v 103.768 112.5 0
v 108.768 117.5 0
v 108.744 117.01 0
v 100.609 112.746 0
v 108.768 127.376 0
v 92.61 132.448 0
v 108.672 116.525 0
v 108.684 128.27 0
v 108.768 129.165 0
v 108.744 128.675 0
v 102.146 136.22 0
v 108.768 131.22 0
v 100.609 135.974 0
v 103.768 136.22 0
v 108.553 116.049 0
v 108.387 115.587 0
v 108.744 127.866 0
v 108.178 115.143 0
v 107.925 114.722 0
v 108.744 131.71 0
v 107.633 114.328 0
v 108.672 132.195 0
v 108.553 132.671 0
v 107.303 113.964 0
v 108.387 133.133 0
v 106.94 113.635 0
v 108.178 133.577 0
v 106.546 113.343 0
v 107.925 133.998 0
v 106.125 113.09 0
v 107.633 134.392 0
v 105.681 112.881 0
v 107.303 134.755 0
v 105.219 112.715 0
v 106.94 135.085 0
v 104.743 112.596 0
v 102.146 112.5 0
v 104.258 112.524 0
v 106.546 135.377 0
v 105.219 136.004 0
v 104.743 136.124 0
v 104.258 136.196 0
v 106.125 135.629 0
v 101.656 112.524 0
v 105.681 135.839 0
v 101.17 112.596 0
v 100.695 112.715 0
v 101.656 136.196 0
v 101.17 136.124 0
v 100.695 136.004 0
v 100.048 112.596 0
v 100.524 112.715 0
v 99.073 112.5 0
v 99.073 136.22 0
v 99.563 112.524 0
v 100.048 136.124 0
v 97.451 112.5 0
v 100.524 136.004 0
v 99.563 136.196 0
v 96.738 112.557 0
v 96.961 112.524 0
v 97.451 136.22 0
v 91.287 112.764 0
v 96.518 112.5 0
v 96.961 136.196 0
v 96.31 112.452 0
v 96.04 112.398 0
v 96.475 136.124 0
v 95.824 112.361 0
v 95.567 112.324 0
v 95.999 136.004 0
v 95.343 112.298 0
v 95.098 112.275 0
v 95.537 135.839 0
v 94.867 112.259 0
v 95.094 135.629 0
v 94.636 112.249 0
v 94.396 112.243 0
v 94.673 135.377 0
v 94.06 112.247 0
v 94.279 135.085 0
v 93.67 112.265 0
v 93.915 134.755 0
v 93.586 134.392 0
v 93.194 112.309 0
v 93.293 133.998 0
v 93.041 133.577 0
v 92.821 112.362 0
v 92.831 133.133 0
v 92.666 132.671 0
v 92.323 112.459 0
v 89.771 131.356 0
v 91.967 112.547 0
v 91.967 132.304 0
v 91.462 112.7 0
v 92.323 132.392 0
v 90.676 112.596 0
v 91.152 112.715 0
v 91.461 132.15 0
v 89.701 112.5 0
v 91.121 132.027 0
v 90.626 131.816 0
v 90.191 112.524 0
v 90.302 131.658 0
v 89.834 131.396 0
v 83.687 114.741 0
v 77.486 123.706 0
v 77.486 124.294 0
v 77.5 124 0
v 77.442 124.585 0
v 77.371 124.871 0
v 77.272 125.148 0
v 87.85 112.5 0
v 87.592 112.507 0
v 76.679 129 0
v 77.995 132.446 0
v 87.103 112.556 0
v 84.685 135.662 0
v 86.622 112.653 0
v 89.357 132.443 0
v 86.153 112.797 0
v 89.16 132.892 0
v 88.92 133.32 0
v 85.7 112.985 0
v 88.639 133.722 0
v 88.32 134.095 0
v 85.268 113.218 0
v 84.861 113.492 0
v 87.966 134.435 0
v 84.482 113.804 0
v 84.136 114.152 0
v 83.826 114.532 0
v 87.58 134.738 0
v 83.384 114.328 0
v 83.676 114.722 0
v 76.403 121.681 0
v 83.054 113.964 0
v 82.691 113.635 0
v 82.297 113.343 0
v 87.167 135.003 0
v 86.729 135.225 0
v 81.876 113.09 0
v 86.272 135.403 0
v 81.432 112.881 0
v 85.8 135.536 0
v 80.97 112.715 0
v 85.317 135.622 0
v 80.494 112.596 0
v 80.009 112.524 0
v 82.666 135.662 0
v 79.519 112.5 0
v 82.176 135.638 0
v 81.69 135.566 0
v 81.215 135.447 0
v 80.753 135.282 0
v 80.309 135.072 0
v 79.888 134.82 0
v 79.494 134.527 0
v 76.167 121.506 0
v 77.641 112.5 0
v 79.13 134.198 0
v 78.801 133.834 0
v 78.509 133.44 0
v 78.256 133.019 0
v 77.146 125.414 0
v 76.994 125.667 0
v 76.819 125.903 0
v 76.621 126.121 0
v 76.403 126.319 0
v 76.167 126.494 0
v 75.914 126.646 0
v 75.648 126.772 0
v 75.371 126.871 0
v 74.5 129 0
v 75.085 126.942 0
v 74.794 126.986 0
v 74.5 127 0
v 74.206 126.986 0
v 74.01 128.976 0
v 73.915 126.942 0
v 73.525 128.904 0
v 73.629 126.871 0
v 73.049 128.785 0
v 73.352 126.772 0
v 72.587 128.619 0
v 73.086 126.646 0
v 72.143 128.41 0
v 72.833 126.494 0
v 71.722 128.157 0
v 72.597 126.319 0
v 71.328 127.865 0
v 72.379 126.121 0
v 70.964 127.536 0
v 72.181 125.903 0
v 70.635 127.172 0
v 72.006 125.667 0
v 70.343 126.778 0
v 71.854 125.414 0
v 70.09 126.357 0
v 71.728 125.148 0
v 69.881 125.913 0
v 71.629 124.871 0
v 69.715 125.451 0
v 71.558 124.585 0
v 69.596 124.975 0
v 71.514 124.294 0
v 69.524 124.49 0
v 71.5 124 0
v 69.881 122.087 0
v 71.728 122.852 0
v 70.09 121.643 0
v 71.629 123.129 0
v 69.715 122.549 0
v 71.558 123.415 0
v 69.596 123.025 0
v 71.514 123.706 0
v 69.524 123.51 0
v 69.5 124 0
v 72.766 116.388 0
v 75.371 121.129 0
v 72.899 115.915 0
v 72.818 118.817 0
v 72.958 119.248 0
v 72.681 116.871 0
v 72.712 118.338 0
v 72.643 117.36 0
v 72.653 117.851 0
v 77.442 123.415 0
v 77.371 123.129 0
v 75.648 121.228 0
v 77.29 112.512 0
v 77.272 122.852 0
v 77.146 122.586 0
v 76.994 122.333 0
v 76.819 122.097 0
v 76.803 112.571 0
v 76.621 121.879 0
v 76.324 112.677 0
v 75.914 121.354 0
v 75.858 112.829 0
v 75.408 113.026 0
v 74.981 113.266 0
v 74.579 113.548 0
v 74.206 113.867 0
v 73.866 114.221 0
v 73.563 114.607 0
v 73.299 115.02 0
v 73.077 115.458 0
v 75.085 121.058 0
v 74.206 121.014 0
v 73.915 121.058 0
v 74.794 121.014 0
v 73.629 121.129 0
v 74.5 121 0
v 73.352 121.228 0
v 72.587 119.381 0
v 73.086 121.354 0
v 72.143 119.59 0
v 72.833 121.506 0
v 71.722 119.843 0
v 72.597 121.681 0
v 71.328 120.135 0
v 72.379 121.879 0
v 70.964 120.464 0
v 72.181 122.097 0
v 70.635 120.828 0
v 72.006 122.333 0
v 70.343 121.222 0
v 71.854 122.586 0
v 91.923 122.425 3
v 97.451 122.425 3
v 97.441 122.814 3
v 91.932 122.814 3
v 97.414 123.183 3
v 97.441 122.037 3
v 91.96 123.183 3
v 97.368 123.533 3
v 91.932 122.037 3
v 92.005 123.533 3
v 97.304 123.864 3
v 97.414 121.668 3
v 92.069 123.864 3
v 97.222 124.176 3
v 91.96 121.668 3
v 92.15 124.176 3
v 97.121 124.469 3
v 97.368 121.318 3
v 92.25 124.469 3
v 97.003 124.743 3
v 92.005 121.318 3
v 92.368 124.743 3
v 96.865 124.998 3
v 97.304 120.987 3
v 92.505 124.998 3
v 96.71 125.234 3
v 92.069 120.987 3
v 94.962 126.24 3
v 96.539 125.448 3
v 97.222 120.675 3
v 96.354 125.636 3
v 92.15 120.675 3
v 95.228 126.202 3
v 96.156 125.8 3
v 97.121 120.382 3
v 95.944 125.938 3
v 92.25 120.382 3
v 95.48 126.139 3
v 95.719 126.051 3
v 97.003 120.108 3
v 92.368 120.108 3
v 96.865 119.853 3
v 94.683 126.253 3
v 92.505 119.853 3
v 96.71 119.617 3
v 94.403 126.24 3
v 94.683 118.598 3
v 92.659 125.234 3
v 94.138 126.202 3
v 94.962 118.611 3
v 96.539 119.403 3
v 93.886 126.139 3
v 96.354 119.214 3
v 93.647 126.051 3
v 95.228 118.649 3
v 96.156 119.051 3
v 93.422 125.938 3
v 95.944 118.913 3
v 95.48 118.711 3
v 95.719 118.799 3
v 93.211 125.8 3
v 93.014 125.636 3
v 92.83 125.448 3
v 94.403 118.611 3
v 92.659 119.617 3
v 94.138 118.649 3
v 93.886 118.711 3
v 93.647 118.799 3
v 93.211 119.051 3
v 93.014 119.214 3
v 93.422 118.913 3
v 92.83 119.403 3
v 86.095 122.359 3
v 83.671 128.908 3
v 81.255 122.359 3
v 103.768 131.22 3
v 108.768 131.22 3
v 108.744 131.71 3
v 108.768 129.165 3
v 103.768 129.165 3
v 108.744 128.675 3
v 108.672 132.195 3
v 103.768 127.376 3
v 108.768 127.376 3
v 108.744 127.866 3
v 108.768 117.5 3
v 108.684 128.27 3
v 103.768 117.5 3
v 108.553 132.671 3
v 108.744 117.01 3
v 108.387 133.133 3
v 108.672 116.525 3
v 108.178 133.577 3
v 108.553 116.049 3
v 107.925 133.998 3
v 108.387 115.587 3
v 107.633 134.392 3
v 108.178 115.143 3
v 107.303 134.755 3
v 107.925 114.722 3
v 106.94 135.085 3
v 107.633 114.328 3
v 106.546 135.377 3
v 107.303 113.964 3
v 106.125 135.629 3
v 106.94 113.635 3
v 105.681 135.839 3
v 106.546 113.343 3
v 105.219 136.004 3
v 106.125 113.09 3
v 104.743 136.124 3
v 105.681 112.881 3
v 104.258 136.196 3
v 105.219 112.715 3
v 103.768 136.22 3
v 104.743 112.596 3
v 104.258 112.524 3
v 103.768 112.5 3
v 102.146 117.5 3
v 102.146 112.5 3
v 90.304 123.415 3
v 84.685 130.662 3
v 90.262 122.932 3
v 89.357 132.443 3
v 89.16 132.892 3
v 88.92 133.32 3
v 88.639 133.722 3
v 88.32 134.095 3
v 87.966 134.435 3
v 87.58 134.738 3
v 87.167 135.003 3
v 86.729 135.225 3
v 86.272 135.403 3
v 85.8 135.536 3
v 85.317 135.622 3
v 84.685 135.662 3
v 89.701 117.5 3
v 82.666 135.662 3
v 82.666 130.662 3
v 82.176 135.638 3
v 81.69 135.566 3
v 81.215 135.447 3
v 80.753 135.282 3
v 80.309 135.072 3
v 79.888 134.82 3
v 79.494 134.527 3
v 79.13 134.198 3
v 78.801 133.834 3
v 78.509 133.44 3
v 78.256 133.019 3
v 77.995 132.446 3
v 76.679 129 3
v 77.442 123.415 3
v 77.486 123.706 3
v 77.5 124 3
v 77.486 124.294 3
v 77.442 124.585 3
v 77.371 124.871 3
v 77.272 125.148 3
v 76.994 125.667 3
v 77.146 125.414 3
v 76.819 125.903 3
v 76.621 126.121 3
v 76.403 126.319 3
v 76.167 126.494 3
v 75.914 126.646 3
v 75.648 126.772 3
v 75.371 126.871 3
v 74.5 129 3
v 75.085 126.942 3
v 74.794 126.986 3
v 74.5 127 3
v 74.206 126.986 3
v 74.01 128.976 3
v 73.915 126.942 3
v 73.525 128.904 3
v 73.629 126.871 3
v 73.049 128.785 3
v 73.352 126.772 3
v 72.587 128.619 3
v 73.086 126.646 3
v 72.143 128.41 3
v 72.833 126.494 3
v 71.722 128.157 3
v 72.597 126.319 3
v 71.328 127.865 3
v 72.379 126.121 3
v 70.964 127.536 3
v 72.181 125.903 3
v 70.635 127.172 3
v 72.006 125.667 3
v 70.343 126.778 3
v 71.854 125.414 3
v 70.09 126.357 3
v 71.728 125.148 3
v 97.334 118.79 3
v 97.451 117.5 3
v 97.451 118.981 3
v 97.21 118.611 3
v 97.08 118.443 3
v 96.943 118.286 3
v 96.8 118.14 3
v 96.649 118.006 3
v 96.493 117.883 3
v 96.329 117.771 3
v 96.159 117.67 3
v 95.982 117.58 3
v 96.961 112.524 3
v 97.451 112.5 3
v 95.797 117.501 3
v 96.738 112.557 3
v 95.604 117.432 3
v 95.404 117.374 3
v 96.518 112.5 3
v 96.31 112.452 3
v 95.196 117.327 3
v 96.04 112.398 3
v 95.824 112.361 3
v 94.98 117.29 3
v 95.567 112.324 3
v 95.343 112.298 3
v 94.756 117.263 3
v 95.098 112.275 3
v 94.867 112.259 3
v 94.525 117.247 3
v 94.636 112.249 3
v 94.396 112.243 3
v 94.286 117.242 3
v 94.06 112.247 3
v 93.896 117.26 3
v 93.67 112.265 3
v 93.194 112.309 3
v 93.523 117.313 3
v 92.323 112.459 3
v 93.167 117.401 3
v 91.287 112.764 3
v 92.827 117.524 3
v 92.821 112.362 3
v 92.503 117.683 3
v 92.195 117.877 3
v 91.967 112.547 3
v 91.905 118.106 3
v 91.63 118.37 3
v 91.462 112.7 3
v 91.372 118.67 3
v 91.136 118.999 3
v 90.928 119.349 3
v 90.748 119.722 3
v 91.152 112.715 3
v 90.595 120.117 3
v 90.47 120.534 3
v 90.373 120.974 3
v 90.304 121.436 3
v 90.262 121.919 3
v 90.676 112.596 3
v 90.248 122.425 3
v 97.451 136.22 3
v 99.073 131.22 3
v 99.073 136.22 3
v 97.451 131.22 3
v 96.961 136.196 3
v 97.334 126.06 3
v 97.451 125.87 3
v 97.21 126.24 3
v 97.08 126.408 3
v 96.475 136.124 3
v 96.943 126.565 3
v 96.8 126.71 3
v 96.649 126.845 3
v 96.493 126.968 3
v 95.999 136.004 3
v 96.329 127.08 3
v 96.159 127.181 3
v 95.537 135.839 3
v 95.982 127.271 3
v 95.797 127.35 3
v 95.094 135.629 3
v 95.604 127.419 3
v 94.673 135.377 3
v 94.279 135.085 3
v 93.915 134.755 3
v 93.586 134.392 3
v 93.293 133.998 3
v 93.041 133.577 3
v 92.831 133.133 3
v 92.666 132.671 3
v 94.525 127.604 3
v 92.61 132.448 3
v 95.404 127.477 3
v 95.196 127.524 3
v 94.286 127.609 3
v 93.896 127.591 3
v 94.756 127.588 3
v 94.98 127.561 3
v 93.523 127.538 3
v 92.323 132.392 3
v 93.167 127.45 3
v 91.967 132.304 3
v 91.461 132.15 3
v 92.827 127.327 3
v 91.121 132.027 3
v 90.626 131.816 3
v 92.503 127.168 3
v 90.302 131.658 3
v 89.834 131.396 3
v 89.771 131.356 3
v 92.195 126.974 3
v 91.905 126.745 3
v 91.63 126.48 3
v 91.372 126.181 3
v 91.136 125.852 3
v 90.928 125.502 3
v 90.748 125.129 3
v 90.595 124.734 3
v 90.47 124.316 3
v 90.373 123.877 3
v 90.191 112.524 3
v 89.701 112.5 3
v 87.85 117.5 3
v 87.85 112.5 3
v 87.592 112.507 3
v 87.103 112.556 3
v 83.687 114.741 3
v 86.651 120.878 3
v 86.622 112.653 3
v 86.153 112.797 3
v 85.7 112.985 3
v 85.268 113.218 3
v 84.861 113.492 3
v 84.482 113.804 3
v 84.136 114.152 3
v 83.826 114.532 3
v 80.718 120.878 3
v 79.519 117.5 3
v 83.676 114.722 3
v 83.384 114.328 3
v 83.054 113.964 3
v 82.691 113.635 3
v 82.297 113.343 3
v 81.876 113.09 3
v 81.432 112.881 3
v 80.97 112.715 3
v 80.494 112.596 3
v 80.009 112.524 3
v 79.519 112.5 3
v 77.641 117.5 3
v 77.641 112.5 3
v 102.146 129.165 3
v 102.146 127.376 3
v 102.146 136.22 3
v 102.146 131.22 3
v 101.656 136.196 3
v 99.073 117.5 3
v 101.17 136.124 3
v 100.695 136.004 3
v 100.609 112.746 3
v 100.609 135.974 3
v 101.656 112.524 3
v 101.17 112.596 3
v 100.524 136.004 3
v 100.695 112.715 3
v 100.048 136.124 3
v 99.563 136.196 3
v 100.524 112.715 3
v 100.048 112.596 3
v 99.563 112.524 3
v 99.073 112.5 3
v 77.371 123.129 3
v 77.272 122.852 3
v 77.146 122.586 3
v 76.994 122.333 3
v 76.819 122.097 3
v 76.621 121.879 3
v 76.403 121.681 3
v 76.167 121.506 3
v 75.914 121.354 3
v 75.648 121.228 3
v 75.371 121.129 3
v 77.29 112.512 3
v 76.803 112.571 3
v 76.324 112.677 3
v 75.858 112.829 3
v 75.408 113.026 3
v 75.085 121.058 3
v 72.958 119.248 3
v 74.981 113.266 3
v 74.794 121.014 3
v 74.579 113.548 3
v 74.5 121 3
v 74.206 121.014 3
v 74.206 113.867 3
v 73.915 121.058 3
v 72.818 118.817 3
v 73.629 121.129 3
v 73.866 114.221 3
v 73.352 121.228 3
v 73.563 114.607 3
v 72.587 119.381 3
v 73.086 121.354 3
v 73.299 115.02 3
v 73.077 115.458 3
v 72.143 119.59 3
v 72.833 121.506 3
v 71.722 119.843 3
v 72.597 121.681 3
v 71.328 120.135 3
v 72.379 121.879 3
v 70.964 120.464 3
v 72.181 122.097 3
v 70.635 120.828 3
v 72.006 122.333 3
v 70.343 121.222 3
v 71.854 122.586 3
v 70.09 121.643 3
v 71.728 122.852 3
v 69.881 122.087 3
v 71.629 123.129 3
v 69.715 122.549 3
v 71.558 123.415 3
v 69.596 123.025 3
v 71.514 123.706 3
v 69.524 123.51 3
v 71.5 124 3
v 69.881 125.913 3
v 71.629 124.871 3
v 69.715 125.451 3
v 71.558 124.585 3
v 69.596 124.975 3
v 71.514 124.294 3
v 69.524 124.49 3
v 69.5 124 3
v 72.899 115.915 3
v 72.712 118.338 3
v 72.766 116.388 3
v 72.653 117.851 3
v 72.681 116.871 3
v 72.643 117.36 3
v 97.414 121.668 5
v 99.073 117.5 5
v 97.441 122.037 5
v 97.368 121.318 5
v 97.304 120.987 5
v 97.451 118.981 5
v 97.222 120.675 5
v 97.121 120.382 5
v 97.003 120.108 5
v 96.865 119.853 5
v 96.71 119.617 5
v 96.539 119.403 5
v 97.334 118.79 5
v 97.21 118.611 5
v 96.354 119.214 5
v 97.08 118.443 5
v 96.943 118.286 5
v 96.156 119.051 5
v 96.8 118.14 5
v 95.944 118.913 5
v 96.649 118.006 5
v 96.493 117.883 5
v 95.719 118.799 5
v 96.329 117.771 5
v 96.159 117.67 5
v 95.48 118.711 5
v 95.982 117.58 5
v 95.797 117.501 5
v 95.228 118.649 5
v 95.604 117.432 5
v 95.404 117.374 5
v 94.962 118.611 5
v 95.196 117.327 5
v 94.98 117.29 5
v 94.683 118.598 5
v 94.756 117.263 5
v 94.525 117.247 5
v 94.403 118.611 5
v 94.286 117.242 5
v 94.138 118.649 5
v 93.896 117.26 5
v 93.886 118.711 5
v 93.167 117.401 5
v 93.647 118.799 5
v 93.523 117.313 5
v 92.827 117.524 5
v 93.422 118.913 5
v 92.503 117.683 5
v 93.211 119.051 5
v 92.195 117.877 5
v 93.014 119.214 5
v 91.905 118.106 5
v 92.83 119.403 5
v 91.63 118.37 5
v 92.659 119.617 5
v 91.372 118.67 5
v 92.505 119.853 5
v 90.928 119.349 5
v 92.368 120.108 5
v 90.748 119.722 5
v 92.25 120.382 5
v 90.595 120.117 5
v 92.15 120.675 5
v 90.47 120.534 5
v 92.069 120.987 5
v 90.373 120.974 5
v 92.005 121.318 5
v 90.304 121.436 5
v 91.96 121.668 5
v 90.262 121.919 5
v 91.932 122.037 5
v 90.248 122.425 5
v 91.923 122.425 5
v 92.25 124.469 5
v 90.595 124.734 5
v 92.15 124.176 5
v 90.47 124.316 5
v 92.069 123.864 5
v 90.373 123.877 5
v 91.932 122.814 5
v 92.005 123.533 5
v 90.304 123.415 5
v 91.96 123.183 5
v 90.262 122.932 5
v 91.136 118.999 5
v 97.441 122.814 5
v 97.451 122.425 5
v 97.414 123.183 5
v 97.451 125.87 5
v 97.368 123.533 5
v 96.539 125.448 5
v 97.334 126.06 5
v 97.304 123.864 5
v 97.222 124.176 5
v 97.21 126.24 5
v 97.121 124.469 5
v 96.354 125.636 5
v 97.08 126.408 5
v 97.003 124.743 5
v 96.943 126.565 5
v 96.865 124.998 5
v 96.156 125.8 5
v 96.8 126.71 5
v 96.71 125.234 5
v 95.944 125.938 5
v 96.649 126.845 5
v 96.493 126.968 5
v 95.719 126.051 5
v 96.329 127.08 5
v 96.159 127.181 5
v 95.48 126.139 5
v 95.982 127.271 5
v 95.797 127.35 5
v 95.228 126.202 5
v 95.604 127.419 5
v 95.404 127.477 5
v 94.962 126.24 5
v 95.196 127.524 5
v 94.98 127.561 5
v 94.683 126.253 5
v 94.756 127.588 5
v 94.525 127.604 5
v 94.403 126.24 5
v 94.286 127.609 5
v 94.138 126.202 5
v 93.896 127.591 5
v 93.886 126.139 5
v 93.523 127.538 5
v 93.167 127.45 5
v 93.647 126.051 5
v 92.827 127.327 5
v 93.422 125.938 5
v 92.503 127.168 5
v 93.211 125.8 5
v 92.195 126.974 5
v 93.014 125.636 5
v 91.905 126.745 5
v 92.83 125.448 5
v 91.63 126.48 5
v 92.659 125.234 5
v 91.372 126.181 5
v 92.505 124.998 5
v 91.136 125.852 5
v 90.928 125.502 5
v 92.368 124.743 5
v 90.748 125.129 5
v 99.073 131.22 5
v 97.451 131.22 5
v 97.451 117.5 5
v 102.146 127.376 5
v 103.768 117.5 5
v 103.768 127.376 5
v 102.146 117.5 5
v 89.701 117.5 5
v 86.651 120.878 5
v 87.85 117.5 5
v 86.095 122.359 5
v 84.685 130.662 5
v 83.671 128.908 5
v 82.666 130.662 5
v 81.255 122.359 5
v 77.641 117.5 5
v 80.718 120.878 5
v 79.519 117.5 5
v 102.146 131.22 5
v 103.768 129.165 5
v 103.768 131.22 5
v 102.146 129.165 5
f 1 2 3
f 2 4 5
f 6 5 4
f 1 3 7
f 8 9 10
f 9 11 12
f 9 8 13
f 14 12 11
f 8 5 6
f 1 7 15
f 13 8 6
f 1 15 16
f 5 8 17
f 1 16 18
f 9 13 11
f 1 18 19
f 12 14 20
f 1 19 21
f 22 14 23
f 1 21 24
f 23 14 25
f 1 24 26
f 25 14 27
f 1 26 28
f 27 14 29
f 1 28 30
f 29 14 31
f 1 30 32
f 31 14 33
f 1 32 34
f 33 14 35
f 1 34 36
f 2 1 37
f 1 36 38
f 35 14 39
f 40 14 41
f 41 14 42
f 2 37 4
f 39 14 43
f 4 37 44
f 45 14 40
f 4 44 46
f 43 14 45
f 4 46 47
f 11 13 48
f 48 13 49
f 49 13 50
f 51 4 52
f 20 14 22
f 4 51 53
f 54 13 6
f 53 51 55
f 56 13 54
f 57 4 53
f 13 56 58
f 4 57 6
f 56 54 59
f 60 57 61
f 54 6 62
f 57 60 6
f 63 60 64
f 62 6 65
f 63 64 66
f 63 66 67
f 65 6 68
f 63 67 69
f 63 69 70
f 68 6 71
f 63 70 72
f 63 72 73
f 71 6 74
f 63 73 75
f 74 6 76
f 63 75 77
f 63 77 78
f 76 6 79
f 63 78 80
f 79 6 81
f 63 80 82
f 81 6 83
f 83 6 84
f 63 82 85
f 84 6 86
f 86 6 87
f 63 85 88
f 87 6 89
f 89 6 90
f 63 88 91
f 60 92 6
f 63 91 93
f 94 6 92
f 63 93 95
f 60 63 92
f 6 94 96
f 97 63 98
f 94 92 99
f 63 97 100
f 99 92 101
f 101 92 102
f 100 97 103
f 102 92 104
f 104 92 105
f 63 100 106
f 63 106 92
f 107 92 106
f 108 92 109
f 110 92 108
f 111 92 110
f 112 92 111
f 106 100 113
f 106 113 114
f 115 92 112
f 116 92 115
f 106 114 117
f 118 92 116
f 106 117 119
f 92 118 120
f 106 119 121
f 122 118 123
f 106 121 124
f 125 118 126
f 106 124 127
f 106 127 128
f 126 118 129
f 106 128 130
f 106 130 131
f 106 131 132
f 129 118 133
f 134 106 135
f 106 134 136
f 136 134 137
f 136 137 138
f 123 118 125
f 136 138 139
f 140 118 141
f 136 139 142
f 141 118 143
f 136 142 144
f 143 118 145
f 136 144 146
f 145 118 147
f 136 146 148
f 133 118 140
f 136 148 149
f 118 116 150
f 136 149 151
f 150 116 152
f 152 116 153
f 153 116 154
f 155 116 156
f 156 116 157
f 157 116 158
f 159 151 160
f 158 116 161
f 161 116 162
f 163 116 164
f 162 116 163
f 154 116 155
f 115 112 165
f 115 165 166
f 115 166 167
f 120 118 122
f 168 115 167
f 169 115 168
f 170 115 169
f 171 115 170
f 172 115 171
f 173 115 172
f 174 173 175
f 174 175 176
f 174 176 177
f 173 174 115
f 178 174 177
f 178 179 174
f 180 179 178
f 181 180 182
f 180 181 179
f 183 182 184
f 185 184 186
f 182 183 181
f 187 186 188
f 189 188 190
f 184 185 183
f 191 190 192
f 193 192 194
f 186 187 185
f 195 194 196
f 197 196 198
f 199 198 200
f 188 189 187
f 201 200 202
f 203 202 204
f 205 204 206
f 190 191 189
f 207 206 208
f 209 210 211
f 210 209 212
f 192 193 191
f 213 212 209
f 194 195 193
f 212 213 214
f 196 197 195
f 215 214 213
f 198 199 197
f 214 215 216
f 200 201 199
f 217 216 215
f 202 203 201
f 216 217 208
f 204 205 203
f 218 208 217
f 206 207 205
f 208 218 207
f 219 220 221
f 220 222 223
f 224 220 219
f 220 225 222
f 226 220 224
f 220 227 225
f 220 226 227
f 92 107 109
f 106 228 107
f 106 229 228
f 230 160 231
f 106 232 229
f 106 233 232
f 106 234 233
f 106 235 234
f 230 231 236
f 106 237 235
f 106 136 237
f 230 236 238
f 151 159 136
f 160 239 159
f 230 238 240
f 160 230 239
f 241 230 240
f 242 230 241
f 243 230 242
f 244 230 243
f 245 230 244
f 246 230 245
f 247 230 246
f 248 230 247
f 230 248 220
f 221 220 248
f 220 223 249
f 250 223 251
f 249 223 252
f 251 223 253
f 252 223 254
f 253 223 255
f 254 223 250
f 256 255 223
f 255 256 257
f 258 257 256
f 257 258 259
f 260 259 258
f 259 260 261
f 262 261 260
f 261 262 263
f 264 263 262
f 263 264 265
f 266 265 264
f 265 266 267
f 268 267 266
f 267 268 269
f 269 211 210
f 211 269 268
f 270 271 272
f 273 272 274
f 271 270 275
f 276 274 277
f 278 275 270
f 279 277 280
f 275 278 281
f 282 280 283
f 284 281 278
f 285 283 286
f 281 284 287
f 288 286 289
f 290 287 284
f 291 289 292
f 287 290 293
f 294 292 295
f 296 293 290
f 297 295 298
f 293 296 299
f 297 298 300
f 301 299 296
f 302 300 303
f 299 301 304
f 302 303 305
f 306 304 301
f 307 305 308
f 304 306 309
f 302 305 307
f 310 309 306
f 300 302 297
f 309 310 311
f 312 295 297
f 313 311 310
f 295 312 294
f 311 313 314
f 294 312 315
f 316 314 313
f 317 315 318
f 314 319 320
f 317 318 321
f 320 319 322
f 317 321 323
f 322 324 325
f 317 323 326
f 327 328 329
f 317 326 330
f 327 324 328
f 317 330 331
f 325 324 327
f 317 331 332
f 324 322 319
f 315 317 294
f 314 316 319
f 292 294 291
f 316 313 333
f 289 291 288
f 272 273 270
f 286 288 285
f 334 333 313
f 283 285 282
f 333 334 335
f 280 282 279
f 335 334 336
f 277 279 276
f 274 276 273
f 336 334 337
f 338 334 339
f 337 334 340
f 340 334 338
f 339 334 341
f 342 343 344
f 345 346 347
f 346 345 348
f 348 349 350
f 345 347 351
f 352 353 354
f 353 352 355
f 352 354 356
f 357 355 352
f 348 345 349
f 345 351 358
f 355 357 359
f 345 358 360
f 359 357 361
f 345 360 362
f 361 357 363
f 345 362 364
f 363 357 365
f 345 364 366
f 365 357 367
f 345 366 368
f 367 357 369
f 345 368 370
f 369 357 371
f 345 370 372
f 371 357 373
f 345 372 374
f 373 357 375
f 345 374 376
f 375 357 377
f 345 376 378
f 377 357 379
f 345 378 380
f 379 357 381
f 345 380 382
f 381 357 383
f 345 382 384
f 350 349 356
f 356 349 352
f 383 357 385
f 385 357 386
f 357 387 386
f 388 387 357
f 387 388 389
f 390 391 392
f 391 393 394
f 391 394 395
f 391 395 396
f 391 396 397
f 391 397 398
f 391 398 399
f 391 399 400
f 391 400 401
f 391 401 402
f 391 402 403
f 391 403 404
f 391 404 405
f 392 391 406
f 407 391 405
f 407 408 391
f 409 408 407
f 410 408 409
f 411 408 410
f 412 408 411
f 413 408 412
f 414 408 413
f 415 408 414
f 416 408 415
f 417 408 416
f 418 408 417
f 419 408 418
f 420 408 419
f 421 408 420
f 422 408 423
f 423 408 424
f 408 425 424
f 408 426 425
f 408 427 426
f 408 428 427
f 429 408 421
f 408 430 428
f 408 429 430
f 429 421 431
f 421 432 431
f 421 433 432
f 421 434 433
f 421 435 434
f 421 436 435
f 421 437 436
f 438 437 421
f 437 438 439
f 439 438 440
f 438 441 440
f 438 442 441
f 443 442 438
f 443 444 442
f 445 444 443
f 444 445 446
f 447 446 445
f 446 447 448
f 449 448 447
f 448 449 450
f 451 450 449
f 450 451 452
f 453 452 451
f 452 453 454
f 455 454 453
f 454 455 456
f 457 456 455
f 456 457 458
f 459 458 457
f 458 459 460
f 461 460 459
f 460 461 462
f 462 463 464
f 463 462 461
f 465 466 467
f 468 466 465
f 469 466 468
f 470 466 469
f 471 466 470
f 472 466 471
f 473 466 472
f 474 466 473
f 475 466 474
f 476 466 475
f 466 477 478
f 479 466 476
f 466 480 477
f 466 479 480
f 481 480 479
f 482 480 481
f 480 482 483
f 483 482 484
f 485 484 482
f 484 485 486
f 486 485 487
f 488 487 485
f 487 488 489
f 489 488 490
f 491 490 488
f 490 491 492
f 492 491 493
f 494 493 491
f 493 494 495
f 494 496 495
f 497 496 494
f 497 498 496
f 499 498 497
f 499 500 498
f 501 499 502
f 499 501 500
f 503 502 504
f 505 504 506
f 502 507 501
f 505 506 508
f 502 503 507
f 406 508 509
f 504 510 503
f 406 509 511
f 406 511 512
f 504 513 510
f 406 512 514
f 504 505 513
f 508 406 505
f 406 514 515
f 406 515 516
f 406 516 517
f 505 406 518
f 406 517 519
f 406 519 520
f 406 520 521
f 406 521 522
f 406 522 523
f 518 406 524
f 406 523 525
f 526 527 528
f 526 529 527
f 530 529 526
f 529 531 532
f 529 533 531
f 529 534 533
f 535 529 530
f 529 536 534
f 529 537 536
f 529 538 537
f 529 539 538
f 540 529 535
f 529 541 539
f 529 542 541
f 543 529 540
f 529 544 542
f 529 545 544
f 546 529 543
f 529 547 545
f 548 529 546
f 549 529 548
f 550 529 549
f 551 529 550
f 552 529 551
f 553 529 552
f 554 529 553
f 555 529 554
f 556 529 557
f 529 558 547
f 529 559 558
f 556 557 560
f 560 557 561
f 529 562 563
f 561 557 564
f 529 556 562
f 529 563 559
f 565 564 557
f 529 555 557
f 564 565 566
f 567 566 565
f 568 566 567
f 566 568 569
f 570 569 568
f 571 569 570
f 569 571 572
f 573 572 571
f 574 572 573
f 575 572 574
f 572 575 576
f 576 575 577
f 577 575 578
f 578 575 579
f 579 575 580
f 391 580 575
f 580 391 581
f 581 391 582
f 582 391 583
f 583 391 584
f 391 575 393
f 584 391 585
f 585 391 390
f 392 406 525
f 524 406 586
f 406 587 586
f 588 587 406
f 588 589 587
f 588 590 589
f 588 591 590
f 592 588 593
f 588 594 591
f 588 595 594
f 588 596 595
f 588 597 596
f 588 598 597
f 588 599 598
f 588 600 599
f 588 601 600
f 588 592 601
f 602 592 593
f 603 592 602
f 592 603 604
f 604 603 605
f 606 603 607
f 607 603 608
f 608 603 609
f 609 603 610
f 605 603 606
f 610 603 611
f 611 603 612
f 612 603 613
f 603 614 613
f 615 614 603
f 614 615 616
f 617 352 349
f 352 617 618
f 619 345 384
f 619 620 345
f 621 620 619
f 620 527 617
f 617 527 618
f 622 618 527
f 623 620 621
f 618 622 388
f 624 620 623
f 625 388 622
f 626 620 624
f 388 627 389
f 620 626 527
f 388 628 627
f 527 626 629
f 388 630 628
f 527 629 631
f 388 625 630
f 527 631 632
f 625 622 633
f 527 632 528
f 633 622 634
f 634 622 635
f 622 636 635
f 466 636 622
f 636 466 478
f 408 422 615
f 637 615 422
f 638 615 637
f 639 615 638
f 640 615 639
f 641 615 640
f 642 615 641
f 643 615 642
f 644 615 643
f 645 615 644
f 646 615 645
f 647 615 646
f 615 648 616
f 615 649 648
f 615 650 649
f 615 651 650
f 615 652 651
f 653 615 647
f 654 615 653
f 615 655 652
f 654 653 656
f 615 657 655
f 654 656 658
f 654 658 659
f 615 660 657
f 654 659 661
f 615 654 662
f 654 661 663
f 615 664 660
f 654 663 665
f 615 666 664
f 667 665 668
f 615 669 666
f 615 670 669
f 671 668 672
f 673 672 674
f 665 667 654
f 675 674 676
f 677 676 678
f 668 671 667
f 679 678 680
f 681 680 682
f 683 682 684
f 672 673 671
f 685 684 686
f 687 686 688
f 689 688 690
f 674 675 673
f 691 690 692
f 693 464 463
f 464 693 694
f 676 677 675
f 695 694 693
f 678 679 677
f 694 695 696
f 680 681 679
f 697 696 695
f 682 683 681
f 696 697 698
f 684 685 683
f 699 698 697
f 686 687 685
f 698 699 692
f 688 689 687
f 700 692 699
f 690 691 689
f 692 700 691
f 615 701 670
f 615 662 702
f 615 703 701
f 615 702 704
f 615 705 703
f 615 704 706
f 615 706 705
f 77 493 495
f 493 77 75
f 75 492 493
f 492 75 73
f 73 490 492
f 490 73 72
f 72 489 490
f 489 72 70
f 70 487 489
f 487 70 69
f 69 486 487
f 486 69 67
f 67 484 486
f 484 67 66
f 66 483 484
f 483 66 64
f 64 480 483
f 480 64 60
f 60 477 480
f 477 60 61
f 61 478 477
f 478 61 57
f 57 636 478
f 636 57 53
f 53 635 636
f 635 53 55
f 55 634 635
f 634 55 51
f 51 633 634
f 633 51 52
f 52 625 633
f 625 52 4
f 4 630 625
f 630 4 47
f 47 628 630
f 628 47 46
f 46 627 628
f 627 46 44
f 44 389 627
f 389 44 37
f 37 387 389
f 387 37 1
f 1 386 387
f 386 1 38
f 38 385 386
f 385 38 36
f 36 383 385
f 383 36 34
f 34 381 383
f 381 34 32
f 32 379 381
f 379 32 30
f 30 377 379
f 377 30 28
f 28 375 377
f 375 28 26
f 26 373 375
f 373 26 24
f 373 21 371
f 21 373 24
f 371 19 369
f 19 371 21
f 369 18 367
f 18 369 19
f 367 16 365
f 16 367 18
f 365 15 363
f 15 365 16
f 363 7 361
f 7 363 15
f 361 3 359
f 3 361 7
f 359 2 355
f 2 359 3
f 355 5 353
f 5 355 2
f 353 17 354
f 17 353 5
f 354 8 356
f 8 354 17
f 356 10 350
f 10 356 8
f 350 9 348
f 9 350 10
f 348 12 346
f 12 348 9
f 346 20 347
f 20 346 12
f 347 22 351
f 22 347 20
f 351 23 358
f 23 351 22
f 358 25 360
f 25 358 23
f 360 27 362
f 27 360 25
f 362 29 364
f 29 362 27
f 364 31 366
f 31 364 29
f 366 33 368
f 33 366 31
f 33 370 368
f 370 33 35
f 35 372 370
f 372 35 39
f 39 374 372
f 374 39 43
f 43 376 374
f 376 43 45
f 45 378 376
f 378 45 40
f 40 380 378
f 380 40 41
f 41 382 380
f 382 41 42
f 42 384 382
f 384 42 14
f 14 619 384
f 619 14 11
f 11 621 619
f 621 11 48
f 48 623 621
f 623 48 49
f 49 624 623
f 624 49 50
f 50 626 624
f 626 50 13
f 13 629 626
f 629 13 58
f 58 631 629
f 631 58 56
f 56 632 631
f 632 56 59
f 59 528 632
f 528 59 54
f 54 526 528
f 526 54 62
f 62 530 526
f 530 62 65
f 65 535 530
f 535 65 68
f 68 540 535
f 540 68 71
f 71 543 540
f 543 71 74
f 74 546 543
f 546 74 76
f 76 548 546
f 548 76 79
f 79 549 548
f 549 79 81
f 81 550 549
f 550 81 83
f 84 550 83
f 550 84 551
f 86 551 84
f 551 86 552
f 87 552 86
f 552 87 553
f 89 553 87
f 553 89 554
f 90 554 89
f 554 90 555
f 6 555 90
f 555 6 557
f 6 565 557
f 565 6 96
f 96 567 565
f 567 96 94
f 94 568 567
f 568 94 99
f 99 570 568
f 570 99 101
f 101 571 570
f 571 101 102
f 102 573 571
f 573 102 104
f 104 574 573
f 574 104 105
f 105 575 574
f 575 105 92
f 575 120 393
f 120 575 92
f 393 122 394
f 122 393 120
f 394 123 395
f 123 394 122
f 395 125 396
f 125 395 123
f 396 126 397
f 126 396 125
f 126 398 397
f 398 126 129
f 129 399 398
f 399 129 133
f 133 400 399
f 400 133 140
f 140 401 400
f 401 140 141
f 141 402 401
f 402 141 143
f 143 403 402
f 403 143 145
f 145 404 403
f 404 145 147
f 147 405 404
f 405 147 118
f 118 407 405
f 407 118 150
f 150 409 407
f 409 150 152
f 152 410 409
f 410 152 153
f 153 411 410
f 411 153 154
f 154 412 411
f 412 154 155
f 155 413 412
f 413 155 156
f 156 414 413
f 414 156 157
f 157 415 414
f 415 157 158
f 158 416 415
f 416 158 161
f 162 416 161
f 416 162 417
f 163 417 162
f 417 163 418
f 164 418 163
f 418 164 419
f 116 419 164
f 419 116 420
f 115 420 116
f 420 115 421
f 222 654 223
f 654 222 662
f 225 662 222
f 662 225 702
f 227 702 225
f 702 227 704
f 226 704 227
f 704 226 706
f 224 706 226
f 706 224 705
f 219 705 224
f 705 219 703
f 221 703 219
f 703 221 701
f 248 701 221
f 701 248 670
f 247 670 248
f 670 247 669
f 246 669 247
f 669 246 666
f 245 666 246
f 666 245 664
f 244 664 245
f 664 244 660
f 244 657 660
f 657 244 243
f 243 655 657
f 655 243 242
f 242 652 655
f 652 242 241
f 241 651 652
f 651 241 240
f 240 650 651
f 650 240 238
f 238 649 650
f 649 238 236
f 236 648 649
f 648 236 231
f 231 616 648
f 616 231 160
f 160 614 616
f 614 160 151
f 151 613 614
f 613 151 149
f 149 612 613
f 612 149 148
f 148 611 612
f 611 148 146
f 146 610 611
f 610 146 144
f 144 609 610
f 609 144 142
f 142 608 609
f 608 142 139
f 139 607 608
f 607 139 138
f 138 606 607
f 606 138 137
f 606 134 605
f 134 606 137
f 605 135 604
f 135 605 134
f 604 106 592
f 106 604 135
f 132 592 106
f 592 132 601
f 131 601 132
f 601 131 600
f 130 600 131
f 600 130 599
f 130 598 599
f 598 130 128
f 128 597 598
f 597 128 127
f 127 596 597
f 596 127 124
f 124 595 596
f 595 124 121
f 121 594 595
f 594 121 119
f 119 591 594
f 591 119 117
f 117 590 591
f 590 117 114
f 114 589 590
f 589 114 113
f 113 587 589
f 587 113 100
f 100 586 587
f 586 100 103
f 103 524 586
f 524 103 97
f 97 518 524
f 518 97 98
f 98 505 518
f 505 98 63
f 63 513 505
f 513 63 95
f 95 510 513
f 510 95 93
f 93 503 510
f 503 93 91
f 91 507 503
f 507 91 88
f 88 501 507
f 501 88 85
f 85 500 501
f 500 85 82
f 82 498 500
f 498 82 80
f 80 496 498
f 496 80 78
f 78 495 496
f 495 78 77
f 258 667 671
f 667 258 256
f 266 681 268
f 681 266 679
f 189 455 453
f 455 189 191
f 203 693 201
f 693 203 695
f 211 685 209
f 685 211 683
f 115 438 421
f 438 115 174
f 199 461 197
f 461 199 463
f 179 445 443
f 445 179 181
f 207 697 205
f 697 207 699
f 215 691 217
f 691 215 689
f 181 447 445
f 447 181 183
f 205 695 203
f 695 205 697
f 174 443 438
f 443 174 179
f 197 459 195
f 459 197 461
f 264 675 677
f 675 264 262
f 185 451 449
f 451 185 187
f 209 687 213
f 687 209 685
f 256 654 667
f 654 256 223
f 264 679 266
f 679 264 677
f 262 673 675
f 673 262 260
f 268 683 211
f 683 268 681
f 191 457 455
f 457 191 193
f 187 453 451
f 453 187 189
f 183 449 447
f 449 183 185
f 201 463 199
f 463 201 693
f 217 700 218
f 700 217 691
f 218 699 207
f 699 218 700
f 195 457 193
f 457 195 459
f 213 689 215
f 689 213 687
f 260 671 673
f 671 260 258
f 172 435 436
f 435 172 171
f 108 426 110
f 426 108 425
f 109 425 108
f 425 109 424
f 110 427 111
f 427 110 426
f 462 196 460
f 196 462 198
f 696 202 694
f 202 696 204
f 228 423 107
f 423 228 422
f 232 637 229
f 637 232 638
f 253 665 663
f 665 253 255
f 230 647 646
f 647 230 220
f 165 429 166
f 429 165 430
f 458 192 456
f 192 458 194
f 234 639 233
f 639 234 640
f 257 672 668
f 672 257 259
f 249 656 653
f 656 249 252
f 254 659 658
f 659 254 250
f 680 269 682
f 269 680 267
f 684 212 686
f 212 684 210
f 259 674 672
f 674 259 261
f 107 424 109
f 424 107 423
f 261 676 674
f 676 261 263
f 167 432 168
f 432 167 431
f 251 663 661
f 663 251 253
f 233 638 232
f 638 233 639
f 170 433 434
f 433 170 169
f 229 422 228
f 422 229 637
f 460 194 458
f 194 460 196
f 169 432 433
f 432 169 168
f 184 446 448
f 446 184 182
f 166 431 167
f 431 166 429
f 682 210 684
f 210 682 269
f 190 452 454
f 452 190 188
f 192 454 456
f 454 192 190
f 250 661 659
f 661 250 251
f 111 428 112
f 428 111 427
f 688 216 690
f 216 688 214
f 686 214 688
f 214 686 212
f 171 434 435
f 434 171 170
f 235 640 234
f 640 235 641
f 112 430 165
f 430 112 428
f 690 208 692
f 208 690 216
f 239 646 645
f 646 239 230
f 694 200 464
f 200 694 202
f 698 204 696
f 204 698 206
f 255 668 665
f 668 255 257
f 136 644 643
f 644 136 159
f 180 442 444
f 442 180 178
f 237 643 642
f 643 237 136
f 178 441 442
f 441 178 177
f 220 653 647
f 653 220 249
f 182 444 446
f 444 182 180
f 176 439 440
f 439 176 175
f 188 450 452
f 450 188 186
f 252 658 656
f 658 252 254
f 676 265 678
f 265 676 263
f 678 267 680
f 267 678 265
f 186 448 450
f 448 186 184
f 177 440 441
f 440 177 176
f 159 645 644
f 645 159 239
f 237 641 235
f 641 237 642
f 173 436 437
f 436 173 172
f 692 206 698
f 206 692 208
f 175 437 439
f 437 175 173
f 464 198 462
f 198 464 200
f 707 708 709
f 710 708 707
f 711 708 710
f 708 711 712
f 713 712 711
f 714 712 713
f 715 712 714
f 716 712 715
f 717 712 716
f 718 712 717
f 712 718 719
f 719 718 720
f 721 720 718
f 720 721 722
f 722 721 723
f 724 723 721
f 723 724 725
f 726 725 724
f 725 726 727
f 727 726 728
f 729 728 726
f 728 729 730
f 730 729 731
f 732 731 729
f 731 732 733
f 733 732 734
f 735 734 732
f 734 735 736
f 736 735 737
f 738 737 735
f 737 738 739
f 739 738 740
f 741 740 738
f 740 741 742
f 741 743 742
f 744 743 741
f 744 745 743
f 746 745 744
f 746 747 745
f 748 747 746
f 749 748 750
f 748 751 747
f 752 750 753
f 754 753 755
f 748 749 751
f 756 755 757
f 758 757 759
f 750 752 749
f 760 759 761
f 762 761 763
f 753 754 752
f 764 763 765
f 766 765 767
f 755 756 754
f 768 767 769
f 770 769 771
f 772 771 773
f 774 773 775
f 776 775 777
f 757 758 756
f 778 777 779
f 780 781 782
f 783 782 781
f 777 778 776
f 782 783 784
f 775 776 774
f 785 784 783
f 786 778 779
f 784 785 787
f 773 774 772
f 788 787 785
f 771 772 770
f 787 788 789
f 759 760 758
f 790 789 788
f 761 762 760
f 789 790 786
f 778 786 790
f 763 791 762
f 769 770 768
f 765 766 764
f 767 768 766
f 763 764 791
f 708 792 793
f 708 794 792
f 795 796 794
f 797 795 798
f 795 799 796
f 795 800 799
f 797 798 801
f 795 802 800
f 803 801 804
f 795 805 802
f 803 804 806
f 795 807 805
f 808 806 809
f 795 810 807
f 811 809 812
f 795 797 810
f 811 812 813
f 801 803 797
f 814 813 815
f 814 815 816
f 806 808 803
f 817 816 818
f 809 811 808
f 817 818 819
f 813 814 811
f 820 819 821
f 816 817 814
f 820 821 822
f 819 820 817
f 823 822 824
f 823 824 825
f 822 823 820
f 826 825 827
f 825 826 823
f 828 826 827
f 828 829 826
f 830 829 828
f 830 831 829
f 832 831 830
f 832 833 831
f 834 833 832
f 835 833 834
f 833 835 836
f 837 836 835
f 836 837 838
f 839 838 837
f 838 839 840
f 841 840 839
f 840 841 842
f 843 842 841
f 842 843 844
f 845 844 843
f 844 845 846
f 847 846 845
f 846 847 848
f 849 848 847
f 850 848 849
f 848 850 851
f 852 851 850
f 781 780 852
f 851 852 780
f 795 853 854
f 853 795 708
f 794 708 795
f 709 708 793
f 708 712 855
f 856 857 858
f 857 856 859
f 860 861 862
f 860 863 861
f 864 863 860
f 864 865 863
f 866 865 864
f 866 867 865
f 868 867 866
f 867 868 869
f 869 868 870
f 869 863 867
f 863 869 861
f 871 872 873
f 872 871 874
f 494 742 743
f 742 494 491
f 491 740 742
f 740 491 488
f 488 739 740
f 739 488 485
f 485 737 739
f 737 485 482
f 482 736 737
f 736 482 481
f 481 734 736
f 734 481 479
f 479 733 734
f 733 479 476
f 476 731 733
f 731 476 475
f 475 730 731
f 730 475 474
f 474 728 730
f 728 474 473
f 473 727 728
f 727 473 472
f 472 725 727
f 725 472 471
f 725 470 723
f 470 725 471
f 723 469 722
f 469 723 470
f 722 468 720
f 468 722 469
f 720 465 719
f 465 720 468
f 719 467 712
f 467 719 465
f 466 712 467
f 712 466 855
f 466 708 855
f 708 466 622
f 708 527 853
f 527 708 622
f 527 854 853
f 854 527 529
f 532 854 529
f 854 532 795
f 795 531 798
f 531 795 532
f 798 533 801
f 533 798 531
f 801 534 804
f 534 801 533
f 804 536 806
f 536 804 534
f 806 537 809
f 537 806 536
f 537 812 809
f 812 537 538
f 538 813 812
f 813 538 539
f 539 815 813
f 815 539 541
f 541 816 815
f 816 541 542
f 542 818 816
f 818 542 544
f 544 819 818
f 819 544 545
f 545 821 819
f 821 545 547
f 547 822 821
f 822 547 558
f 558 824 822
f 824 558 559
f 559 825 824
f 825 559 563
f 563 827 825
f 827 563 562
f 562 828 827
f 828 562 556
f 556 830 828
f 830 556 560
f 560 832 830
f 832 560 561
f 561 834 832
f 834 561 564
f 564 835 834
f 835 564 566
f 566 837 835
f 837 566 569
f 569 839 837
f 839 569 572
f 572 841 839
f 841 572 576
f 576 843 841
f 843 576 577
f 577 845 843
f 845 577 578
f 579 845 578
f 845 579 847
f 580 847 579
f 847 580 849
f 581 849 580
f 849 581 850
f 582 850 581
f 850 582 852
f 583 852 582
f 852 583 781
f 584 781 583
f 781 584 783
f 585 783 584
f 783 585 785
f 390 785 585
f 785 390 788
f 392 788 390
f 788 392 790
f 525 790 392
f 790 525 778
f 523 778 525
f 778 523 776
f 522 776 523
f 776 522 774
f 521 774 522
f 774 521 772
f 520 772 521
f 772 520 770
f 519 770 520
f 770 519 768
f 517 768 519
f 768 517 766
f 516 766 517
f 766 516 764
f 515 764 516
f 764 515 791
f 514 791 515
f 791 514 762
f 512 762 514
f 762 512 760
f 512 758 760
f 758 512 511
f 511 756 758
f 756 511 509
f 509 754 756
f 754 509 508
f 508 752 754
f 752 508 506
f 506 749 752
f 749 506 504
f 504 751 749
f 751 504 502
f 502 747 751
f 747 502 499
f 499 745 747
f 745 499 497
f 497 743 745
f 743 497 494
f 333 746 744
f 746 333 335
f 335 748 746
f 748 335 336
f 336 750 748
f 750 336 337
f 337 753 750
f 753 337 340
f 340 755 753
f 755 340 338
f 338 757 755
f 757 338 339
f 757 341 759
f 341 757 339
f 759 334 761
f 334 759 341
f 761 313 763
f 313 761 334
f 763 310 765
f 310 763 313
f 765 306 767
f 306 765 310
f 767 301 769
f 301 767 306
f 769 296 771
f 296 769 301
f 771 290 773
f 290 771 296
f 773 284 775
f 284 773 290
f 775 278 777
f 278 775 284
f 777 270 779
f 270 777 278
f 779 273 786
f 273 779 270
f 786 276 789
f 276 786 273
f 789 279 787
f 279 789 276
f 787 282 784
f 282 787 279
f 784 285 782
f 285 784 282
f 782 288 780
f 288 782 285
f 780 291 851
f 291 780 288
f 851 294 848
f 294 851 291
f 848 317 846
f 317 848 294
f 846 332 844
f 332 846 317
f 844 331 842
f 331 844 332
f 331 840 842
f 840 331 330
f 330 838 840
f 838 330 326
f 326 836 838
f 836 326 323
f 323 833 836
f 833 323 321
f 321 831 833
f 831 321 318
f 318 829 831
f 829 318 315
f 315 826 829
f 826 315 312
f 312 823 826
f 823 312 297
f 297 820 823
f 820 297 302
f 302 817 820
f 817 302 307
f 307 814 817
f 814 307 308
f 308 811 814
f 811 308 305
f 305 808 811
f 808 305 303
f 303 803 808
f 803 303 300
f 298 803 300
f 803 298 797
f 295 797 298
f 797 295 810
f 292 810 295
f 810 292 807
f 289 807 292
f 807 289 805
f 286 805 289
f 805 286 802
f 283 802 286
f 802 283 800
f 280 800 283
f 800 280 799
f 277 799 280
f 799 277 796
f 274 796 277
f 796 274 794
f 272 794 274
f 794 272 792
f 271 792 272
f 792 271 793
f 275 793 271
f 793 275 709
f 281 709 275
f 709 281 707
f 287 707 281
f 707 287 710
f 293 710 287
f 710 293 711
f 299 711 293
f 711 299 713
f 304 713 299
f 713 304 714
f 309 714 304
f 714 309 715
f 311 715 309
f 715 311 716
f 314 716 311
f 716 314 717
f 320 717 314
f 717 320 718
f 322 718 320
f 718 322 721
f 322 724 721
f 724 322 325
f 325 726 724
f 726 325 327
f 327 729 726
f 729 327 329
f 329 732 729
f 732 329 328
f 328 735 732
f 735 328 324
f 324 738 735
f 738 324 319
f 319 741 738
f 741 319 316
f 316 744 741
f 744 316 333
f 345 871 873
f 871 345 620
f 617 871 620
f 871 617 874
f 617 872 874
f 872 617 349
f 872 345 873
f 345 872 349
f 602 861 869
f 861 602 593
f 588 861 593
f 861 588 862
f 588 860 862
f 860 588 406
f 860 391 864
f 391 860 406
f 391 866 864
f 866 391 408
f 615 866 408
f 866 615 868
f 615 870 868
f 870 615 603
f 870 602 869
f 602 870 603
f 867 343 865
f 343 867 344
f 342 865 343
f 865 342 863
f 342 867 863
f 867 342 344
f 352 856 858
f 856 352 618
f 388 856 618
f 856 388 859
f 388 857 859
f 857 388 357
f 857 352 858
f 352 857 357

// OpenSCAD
// ===============================
//   CUSTOM KEYCHAIN – 3 Baris (max 3 nama)
// ===============================

/* [Text Alignment] */
Text_Align = "left"; // ["left","center","right"]

/* [Nama 1] */
n1_line1 = "Adi";
n1_line2 = "";
n1_line3 = "";

/* [Nama 2] */
n2_line1 = "";
n2_line2 = "";
n2_line3 = "";

/* [Nama 3] */
n3_line1 = "";
n3_line2 = "";
n3_line3 = "";

/* [Warna] */
Plate_Color_Name = "White";    // [Yellow, White, Sky Blue, Red, Peak Green, Orange, Grape Purple, Black, Beige, Barbie Pink]
Text_Color_Name  = "Sky Blue"; // [Yellow, White, Sky Blue, Red, Peak Green, Orange, Grape Purple, Black, Beige, Barbie Pink]

/* [Font Settings] */
Font_Name         = "Bagel Fat One"; // font [Bagel Fat One, Chewy, Courgette, Dancing Script, Lemon, Lobster, Pacifico, Playfair, Lily Script One, Sacramento, Bubblegum Sans, DynaPuff, Alkatra, Archivo, Sour Gummy, Shrikhand]
Font_Size         = 13;
Font_Weight_Steps = 0; // [-10:1:20]
Font_Weight       = Font_Weight_Steps / 10;

// Faktor estimasi lebar rata-rata per karakter (tanpa tabel kalibrasi)
// Sesuaikan nilai ini jika posisi lubang kurang pas untuk font tertentu
Width_Factor      = 0.76; // [0.5:0.01:1.2]

/* [Model Settings] */
Text_Height        = 2;
Plate_Height       = 3;
Border_Size        = 5;
Hole_Radius        = 3;
Hole_position      = 0; // [0:0.5:5] Mengatur seberapa masuk lubang ke dalam huruf pertama
Hole_Height_Offset = 0;
Line2_Spacing      = 1.35; // [0.5:0.1:2]
Line3_Spacing      = 1.35; // [0.5:0.1:2]
Offset_L1          = 0;   // [-40:1:40]
Offset_L2          = 0;   // [-40:1:40]
Offset_L3          = 0;   // [-40:1:40]

/* [Layout Grid] */
bed_x     = 235;
bed_y     = 235;
grid_cols = 1;
slot_w    = 90;
gap_x     = 15;
gap_y     = 15;

function getColor(name) =
    name == "Yellow"       ? "#FFD700" :
    name == "White"        ? "#FFFFFF" :
    name == "Sky Blue"     ? "#87CEEB" :
    name == "Red"          ? "#FF0000" :
    name == "Peak Green"   ? "#00C853" :
    name == "Orange"       ? "#FF5E00" :
    name == "Grape Purple" ? "#6A0DAD" :
    name == "Black"        ? "#000000" :
    name == "Beige"        ? "#F5F5DC" :
    name == "Barbie Pink"  ? "#FF69B4" :
    "#FFFFFF";

Plate_Color = getColor(Plate_Color_Name);
Text_Color  = getColor(Text_Color_Name);
$fn = 64;

slot_h = Font_Size * (1 + Line2_Spacing + Line3_Spacing) + 2 * Border_Size;

// ─────────────────────────────────────────────
// ESTIMASI LEBAR KATA (tanpa tabel kalibrasi font)
// ─────────────────────────────────────────────
function get_word_width(word) = len(word) * Font_Size * Width_Factor;

// ─────────────────────────────────────────────
// ALIGNMENT TEXT & DYNAMIC HOLE LOGIC
// (Struktur identik dengan gantungan_2_3__ligature.scad)
// ─────────────────────────────────────────────
function align_offset() =
    Text_Align == "left"   ? -slot_w/2 + Border_Size :
    Text_Align == "right"  ?  slot_w/2 - Border_Size :
    0;

function get_line_left(word, offset_val) =
    Text_Align == "left"   ? align_offset() + offset_val :
    Text_Align == "center" ? align_offset() + offset_val - get_word_width(word) / 2 :
    Text_Align == "right"  ? align_offset() + offset_val - get_word_width(word) :
    align_offset() + offset_val;

// Lobang selalu diposisikan relatif terhadap batas kiri Baris 1 (l1) agar tidak melayang
function fixedHoleX(l1) = get_line_left(l1, Offset_L1) - Hole_Radius + Hole_position;
function fixedHoleY() = Font_Size * 0.5 + Hole_Height_Offset;

// Merender baris teks dengan alignment manual (bukan halign bawaan OpenSCAD)
// agar posisi teks & lubang selalu sinkron
module render_line(word) {
    align_shift = 
        Text_Align == "center" ? -get_word_width(word) / 2 :
        Text_Align == "right"  ? -get_word_width(word) :
        0;
    translate([align_shift, 0, 0])
        offset(delta = Font_Weight)
            text(word, size = Font_Size, font = Font_Name);
}

// ─────────────────────────────────────────────
// GEOMETRY GENERATION
// ─────────────────────────────────────────────
module generateTextShape(l1, l2, l3) {
    union() {
        base_x = align_offset();

        translate([base_x + Offset_L1, 0, 0])
            render_line(l1);

        if (l2 != "")
            translate([base_x + Offset_L2, -Font_Size * Line2_Spacing, 0])
                render_line(l2);

        if (l3 != "")
            translate([base_x + Offset_L3, -Font_Size * (Line2_Spacing + Line3_Spacing), 0])
                render_line(l3);
    }
}

module generateBackPlate(l1, l2, l3) {
    union() {
        // plate dari text
        linear_extrude(Plate_Height)
            offset(r = Border_Size)
                generateTextShape(l1, l2, l3);

        // ring hole FIX kiri (DYNAMIC)
        hull() {
            translate([fixedHoleX(l1), fixedHoleY(), 0])
                cylinder(h = Plate_Height, r = Hole_Radius + 2);

            translate([fixedHoleX(l1) + 5, fixedHoleY(), 0])
                cylinder(h = Plate_Height, r = Hole_Radius + 2);
        }
    }
}

module generateBackPlateWithHole(l1, l2, l3) {
    color(Plate_Color)
    difference() {
        generateBackPlate(l1, l2, l3);

        translate([fixedHoleX(l1), fixedHoleY(), -1])
            cylinder(h = Plate_Height + 2, r = Hole_Radius);
    }
}

module generateKeychainText(l1, l2, l3) {
    translate([0, 0, Plate_Height])
        color(Text_Color)
            linear_extrude(Text_Height)
                generateTextShape(l1, l2, l3);
}

module keychain(l1, l2, l3) {
    generateBackPlateWithHole(l1, l2, l3);
    generateKeychainText(l1, l2, l3);
}

// ─────────────────────────────────────────────
// DATA FILTER & GRID
// ─────────────────────────────────────────────
all_l1 = [n1_line1, n2_line1, n3_line1];
all_l2 = [n1_line2, n2_line2, n3_line2];
all_l3 = [n1_line3, n2_line3, n3_line3];

filled_l1 = [for (i = [0:2]) if (all_l1[i] != "") all_l1[i]];
filled_l2 = [for (i = [0:2]) if (all_l1[i] != "") all_l2[i]];
filled_l3 = [for (i = [0:2]) if (all_l1[i] != "") all_l3[i]];

total  = len(filled_l1);

grid_rows = ceil(total / grid_cols);
total_w   = grid_cols * slot_w + (grid_cols - 1) * gap_x;
total_h   = grid_rows * slot_h + (grid_rows - 1) * gap_y;

start_x   = (bed_x - total_w) / 2 + slot_w / 2;
start_y   = (bed_y - total_h) / 2 + slot_h / 2;

// ─────────────────────────────────────────────
// RENDER
// ─────────────────────────────────────────────
for (idx = [0 : total - 1]) {
    col = idx % grid_cols;
    row = floor(idx / grid_cols);
    x   = start_x + col * (slot_w + gap_x);
    y   = start_y + (grid_rows - 1 - row) * (slot_h + gap_y);

    translate([x, y, 0])
        keychain(filled_l1[idx], filled_l2[idx], filled_l3[idx]);
}
